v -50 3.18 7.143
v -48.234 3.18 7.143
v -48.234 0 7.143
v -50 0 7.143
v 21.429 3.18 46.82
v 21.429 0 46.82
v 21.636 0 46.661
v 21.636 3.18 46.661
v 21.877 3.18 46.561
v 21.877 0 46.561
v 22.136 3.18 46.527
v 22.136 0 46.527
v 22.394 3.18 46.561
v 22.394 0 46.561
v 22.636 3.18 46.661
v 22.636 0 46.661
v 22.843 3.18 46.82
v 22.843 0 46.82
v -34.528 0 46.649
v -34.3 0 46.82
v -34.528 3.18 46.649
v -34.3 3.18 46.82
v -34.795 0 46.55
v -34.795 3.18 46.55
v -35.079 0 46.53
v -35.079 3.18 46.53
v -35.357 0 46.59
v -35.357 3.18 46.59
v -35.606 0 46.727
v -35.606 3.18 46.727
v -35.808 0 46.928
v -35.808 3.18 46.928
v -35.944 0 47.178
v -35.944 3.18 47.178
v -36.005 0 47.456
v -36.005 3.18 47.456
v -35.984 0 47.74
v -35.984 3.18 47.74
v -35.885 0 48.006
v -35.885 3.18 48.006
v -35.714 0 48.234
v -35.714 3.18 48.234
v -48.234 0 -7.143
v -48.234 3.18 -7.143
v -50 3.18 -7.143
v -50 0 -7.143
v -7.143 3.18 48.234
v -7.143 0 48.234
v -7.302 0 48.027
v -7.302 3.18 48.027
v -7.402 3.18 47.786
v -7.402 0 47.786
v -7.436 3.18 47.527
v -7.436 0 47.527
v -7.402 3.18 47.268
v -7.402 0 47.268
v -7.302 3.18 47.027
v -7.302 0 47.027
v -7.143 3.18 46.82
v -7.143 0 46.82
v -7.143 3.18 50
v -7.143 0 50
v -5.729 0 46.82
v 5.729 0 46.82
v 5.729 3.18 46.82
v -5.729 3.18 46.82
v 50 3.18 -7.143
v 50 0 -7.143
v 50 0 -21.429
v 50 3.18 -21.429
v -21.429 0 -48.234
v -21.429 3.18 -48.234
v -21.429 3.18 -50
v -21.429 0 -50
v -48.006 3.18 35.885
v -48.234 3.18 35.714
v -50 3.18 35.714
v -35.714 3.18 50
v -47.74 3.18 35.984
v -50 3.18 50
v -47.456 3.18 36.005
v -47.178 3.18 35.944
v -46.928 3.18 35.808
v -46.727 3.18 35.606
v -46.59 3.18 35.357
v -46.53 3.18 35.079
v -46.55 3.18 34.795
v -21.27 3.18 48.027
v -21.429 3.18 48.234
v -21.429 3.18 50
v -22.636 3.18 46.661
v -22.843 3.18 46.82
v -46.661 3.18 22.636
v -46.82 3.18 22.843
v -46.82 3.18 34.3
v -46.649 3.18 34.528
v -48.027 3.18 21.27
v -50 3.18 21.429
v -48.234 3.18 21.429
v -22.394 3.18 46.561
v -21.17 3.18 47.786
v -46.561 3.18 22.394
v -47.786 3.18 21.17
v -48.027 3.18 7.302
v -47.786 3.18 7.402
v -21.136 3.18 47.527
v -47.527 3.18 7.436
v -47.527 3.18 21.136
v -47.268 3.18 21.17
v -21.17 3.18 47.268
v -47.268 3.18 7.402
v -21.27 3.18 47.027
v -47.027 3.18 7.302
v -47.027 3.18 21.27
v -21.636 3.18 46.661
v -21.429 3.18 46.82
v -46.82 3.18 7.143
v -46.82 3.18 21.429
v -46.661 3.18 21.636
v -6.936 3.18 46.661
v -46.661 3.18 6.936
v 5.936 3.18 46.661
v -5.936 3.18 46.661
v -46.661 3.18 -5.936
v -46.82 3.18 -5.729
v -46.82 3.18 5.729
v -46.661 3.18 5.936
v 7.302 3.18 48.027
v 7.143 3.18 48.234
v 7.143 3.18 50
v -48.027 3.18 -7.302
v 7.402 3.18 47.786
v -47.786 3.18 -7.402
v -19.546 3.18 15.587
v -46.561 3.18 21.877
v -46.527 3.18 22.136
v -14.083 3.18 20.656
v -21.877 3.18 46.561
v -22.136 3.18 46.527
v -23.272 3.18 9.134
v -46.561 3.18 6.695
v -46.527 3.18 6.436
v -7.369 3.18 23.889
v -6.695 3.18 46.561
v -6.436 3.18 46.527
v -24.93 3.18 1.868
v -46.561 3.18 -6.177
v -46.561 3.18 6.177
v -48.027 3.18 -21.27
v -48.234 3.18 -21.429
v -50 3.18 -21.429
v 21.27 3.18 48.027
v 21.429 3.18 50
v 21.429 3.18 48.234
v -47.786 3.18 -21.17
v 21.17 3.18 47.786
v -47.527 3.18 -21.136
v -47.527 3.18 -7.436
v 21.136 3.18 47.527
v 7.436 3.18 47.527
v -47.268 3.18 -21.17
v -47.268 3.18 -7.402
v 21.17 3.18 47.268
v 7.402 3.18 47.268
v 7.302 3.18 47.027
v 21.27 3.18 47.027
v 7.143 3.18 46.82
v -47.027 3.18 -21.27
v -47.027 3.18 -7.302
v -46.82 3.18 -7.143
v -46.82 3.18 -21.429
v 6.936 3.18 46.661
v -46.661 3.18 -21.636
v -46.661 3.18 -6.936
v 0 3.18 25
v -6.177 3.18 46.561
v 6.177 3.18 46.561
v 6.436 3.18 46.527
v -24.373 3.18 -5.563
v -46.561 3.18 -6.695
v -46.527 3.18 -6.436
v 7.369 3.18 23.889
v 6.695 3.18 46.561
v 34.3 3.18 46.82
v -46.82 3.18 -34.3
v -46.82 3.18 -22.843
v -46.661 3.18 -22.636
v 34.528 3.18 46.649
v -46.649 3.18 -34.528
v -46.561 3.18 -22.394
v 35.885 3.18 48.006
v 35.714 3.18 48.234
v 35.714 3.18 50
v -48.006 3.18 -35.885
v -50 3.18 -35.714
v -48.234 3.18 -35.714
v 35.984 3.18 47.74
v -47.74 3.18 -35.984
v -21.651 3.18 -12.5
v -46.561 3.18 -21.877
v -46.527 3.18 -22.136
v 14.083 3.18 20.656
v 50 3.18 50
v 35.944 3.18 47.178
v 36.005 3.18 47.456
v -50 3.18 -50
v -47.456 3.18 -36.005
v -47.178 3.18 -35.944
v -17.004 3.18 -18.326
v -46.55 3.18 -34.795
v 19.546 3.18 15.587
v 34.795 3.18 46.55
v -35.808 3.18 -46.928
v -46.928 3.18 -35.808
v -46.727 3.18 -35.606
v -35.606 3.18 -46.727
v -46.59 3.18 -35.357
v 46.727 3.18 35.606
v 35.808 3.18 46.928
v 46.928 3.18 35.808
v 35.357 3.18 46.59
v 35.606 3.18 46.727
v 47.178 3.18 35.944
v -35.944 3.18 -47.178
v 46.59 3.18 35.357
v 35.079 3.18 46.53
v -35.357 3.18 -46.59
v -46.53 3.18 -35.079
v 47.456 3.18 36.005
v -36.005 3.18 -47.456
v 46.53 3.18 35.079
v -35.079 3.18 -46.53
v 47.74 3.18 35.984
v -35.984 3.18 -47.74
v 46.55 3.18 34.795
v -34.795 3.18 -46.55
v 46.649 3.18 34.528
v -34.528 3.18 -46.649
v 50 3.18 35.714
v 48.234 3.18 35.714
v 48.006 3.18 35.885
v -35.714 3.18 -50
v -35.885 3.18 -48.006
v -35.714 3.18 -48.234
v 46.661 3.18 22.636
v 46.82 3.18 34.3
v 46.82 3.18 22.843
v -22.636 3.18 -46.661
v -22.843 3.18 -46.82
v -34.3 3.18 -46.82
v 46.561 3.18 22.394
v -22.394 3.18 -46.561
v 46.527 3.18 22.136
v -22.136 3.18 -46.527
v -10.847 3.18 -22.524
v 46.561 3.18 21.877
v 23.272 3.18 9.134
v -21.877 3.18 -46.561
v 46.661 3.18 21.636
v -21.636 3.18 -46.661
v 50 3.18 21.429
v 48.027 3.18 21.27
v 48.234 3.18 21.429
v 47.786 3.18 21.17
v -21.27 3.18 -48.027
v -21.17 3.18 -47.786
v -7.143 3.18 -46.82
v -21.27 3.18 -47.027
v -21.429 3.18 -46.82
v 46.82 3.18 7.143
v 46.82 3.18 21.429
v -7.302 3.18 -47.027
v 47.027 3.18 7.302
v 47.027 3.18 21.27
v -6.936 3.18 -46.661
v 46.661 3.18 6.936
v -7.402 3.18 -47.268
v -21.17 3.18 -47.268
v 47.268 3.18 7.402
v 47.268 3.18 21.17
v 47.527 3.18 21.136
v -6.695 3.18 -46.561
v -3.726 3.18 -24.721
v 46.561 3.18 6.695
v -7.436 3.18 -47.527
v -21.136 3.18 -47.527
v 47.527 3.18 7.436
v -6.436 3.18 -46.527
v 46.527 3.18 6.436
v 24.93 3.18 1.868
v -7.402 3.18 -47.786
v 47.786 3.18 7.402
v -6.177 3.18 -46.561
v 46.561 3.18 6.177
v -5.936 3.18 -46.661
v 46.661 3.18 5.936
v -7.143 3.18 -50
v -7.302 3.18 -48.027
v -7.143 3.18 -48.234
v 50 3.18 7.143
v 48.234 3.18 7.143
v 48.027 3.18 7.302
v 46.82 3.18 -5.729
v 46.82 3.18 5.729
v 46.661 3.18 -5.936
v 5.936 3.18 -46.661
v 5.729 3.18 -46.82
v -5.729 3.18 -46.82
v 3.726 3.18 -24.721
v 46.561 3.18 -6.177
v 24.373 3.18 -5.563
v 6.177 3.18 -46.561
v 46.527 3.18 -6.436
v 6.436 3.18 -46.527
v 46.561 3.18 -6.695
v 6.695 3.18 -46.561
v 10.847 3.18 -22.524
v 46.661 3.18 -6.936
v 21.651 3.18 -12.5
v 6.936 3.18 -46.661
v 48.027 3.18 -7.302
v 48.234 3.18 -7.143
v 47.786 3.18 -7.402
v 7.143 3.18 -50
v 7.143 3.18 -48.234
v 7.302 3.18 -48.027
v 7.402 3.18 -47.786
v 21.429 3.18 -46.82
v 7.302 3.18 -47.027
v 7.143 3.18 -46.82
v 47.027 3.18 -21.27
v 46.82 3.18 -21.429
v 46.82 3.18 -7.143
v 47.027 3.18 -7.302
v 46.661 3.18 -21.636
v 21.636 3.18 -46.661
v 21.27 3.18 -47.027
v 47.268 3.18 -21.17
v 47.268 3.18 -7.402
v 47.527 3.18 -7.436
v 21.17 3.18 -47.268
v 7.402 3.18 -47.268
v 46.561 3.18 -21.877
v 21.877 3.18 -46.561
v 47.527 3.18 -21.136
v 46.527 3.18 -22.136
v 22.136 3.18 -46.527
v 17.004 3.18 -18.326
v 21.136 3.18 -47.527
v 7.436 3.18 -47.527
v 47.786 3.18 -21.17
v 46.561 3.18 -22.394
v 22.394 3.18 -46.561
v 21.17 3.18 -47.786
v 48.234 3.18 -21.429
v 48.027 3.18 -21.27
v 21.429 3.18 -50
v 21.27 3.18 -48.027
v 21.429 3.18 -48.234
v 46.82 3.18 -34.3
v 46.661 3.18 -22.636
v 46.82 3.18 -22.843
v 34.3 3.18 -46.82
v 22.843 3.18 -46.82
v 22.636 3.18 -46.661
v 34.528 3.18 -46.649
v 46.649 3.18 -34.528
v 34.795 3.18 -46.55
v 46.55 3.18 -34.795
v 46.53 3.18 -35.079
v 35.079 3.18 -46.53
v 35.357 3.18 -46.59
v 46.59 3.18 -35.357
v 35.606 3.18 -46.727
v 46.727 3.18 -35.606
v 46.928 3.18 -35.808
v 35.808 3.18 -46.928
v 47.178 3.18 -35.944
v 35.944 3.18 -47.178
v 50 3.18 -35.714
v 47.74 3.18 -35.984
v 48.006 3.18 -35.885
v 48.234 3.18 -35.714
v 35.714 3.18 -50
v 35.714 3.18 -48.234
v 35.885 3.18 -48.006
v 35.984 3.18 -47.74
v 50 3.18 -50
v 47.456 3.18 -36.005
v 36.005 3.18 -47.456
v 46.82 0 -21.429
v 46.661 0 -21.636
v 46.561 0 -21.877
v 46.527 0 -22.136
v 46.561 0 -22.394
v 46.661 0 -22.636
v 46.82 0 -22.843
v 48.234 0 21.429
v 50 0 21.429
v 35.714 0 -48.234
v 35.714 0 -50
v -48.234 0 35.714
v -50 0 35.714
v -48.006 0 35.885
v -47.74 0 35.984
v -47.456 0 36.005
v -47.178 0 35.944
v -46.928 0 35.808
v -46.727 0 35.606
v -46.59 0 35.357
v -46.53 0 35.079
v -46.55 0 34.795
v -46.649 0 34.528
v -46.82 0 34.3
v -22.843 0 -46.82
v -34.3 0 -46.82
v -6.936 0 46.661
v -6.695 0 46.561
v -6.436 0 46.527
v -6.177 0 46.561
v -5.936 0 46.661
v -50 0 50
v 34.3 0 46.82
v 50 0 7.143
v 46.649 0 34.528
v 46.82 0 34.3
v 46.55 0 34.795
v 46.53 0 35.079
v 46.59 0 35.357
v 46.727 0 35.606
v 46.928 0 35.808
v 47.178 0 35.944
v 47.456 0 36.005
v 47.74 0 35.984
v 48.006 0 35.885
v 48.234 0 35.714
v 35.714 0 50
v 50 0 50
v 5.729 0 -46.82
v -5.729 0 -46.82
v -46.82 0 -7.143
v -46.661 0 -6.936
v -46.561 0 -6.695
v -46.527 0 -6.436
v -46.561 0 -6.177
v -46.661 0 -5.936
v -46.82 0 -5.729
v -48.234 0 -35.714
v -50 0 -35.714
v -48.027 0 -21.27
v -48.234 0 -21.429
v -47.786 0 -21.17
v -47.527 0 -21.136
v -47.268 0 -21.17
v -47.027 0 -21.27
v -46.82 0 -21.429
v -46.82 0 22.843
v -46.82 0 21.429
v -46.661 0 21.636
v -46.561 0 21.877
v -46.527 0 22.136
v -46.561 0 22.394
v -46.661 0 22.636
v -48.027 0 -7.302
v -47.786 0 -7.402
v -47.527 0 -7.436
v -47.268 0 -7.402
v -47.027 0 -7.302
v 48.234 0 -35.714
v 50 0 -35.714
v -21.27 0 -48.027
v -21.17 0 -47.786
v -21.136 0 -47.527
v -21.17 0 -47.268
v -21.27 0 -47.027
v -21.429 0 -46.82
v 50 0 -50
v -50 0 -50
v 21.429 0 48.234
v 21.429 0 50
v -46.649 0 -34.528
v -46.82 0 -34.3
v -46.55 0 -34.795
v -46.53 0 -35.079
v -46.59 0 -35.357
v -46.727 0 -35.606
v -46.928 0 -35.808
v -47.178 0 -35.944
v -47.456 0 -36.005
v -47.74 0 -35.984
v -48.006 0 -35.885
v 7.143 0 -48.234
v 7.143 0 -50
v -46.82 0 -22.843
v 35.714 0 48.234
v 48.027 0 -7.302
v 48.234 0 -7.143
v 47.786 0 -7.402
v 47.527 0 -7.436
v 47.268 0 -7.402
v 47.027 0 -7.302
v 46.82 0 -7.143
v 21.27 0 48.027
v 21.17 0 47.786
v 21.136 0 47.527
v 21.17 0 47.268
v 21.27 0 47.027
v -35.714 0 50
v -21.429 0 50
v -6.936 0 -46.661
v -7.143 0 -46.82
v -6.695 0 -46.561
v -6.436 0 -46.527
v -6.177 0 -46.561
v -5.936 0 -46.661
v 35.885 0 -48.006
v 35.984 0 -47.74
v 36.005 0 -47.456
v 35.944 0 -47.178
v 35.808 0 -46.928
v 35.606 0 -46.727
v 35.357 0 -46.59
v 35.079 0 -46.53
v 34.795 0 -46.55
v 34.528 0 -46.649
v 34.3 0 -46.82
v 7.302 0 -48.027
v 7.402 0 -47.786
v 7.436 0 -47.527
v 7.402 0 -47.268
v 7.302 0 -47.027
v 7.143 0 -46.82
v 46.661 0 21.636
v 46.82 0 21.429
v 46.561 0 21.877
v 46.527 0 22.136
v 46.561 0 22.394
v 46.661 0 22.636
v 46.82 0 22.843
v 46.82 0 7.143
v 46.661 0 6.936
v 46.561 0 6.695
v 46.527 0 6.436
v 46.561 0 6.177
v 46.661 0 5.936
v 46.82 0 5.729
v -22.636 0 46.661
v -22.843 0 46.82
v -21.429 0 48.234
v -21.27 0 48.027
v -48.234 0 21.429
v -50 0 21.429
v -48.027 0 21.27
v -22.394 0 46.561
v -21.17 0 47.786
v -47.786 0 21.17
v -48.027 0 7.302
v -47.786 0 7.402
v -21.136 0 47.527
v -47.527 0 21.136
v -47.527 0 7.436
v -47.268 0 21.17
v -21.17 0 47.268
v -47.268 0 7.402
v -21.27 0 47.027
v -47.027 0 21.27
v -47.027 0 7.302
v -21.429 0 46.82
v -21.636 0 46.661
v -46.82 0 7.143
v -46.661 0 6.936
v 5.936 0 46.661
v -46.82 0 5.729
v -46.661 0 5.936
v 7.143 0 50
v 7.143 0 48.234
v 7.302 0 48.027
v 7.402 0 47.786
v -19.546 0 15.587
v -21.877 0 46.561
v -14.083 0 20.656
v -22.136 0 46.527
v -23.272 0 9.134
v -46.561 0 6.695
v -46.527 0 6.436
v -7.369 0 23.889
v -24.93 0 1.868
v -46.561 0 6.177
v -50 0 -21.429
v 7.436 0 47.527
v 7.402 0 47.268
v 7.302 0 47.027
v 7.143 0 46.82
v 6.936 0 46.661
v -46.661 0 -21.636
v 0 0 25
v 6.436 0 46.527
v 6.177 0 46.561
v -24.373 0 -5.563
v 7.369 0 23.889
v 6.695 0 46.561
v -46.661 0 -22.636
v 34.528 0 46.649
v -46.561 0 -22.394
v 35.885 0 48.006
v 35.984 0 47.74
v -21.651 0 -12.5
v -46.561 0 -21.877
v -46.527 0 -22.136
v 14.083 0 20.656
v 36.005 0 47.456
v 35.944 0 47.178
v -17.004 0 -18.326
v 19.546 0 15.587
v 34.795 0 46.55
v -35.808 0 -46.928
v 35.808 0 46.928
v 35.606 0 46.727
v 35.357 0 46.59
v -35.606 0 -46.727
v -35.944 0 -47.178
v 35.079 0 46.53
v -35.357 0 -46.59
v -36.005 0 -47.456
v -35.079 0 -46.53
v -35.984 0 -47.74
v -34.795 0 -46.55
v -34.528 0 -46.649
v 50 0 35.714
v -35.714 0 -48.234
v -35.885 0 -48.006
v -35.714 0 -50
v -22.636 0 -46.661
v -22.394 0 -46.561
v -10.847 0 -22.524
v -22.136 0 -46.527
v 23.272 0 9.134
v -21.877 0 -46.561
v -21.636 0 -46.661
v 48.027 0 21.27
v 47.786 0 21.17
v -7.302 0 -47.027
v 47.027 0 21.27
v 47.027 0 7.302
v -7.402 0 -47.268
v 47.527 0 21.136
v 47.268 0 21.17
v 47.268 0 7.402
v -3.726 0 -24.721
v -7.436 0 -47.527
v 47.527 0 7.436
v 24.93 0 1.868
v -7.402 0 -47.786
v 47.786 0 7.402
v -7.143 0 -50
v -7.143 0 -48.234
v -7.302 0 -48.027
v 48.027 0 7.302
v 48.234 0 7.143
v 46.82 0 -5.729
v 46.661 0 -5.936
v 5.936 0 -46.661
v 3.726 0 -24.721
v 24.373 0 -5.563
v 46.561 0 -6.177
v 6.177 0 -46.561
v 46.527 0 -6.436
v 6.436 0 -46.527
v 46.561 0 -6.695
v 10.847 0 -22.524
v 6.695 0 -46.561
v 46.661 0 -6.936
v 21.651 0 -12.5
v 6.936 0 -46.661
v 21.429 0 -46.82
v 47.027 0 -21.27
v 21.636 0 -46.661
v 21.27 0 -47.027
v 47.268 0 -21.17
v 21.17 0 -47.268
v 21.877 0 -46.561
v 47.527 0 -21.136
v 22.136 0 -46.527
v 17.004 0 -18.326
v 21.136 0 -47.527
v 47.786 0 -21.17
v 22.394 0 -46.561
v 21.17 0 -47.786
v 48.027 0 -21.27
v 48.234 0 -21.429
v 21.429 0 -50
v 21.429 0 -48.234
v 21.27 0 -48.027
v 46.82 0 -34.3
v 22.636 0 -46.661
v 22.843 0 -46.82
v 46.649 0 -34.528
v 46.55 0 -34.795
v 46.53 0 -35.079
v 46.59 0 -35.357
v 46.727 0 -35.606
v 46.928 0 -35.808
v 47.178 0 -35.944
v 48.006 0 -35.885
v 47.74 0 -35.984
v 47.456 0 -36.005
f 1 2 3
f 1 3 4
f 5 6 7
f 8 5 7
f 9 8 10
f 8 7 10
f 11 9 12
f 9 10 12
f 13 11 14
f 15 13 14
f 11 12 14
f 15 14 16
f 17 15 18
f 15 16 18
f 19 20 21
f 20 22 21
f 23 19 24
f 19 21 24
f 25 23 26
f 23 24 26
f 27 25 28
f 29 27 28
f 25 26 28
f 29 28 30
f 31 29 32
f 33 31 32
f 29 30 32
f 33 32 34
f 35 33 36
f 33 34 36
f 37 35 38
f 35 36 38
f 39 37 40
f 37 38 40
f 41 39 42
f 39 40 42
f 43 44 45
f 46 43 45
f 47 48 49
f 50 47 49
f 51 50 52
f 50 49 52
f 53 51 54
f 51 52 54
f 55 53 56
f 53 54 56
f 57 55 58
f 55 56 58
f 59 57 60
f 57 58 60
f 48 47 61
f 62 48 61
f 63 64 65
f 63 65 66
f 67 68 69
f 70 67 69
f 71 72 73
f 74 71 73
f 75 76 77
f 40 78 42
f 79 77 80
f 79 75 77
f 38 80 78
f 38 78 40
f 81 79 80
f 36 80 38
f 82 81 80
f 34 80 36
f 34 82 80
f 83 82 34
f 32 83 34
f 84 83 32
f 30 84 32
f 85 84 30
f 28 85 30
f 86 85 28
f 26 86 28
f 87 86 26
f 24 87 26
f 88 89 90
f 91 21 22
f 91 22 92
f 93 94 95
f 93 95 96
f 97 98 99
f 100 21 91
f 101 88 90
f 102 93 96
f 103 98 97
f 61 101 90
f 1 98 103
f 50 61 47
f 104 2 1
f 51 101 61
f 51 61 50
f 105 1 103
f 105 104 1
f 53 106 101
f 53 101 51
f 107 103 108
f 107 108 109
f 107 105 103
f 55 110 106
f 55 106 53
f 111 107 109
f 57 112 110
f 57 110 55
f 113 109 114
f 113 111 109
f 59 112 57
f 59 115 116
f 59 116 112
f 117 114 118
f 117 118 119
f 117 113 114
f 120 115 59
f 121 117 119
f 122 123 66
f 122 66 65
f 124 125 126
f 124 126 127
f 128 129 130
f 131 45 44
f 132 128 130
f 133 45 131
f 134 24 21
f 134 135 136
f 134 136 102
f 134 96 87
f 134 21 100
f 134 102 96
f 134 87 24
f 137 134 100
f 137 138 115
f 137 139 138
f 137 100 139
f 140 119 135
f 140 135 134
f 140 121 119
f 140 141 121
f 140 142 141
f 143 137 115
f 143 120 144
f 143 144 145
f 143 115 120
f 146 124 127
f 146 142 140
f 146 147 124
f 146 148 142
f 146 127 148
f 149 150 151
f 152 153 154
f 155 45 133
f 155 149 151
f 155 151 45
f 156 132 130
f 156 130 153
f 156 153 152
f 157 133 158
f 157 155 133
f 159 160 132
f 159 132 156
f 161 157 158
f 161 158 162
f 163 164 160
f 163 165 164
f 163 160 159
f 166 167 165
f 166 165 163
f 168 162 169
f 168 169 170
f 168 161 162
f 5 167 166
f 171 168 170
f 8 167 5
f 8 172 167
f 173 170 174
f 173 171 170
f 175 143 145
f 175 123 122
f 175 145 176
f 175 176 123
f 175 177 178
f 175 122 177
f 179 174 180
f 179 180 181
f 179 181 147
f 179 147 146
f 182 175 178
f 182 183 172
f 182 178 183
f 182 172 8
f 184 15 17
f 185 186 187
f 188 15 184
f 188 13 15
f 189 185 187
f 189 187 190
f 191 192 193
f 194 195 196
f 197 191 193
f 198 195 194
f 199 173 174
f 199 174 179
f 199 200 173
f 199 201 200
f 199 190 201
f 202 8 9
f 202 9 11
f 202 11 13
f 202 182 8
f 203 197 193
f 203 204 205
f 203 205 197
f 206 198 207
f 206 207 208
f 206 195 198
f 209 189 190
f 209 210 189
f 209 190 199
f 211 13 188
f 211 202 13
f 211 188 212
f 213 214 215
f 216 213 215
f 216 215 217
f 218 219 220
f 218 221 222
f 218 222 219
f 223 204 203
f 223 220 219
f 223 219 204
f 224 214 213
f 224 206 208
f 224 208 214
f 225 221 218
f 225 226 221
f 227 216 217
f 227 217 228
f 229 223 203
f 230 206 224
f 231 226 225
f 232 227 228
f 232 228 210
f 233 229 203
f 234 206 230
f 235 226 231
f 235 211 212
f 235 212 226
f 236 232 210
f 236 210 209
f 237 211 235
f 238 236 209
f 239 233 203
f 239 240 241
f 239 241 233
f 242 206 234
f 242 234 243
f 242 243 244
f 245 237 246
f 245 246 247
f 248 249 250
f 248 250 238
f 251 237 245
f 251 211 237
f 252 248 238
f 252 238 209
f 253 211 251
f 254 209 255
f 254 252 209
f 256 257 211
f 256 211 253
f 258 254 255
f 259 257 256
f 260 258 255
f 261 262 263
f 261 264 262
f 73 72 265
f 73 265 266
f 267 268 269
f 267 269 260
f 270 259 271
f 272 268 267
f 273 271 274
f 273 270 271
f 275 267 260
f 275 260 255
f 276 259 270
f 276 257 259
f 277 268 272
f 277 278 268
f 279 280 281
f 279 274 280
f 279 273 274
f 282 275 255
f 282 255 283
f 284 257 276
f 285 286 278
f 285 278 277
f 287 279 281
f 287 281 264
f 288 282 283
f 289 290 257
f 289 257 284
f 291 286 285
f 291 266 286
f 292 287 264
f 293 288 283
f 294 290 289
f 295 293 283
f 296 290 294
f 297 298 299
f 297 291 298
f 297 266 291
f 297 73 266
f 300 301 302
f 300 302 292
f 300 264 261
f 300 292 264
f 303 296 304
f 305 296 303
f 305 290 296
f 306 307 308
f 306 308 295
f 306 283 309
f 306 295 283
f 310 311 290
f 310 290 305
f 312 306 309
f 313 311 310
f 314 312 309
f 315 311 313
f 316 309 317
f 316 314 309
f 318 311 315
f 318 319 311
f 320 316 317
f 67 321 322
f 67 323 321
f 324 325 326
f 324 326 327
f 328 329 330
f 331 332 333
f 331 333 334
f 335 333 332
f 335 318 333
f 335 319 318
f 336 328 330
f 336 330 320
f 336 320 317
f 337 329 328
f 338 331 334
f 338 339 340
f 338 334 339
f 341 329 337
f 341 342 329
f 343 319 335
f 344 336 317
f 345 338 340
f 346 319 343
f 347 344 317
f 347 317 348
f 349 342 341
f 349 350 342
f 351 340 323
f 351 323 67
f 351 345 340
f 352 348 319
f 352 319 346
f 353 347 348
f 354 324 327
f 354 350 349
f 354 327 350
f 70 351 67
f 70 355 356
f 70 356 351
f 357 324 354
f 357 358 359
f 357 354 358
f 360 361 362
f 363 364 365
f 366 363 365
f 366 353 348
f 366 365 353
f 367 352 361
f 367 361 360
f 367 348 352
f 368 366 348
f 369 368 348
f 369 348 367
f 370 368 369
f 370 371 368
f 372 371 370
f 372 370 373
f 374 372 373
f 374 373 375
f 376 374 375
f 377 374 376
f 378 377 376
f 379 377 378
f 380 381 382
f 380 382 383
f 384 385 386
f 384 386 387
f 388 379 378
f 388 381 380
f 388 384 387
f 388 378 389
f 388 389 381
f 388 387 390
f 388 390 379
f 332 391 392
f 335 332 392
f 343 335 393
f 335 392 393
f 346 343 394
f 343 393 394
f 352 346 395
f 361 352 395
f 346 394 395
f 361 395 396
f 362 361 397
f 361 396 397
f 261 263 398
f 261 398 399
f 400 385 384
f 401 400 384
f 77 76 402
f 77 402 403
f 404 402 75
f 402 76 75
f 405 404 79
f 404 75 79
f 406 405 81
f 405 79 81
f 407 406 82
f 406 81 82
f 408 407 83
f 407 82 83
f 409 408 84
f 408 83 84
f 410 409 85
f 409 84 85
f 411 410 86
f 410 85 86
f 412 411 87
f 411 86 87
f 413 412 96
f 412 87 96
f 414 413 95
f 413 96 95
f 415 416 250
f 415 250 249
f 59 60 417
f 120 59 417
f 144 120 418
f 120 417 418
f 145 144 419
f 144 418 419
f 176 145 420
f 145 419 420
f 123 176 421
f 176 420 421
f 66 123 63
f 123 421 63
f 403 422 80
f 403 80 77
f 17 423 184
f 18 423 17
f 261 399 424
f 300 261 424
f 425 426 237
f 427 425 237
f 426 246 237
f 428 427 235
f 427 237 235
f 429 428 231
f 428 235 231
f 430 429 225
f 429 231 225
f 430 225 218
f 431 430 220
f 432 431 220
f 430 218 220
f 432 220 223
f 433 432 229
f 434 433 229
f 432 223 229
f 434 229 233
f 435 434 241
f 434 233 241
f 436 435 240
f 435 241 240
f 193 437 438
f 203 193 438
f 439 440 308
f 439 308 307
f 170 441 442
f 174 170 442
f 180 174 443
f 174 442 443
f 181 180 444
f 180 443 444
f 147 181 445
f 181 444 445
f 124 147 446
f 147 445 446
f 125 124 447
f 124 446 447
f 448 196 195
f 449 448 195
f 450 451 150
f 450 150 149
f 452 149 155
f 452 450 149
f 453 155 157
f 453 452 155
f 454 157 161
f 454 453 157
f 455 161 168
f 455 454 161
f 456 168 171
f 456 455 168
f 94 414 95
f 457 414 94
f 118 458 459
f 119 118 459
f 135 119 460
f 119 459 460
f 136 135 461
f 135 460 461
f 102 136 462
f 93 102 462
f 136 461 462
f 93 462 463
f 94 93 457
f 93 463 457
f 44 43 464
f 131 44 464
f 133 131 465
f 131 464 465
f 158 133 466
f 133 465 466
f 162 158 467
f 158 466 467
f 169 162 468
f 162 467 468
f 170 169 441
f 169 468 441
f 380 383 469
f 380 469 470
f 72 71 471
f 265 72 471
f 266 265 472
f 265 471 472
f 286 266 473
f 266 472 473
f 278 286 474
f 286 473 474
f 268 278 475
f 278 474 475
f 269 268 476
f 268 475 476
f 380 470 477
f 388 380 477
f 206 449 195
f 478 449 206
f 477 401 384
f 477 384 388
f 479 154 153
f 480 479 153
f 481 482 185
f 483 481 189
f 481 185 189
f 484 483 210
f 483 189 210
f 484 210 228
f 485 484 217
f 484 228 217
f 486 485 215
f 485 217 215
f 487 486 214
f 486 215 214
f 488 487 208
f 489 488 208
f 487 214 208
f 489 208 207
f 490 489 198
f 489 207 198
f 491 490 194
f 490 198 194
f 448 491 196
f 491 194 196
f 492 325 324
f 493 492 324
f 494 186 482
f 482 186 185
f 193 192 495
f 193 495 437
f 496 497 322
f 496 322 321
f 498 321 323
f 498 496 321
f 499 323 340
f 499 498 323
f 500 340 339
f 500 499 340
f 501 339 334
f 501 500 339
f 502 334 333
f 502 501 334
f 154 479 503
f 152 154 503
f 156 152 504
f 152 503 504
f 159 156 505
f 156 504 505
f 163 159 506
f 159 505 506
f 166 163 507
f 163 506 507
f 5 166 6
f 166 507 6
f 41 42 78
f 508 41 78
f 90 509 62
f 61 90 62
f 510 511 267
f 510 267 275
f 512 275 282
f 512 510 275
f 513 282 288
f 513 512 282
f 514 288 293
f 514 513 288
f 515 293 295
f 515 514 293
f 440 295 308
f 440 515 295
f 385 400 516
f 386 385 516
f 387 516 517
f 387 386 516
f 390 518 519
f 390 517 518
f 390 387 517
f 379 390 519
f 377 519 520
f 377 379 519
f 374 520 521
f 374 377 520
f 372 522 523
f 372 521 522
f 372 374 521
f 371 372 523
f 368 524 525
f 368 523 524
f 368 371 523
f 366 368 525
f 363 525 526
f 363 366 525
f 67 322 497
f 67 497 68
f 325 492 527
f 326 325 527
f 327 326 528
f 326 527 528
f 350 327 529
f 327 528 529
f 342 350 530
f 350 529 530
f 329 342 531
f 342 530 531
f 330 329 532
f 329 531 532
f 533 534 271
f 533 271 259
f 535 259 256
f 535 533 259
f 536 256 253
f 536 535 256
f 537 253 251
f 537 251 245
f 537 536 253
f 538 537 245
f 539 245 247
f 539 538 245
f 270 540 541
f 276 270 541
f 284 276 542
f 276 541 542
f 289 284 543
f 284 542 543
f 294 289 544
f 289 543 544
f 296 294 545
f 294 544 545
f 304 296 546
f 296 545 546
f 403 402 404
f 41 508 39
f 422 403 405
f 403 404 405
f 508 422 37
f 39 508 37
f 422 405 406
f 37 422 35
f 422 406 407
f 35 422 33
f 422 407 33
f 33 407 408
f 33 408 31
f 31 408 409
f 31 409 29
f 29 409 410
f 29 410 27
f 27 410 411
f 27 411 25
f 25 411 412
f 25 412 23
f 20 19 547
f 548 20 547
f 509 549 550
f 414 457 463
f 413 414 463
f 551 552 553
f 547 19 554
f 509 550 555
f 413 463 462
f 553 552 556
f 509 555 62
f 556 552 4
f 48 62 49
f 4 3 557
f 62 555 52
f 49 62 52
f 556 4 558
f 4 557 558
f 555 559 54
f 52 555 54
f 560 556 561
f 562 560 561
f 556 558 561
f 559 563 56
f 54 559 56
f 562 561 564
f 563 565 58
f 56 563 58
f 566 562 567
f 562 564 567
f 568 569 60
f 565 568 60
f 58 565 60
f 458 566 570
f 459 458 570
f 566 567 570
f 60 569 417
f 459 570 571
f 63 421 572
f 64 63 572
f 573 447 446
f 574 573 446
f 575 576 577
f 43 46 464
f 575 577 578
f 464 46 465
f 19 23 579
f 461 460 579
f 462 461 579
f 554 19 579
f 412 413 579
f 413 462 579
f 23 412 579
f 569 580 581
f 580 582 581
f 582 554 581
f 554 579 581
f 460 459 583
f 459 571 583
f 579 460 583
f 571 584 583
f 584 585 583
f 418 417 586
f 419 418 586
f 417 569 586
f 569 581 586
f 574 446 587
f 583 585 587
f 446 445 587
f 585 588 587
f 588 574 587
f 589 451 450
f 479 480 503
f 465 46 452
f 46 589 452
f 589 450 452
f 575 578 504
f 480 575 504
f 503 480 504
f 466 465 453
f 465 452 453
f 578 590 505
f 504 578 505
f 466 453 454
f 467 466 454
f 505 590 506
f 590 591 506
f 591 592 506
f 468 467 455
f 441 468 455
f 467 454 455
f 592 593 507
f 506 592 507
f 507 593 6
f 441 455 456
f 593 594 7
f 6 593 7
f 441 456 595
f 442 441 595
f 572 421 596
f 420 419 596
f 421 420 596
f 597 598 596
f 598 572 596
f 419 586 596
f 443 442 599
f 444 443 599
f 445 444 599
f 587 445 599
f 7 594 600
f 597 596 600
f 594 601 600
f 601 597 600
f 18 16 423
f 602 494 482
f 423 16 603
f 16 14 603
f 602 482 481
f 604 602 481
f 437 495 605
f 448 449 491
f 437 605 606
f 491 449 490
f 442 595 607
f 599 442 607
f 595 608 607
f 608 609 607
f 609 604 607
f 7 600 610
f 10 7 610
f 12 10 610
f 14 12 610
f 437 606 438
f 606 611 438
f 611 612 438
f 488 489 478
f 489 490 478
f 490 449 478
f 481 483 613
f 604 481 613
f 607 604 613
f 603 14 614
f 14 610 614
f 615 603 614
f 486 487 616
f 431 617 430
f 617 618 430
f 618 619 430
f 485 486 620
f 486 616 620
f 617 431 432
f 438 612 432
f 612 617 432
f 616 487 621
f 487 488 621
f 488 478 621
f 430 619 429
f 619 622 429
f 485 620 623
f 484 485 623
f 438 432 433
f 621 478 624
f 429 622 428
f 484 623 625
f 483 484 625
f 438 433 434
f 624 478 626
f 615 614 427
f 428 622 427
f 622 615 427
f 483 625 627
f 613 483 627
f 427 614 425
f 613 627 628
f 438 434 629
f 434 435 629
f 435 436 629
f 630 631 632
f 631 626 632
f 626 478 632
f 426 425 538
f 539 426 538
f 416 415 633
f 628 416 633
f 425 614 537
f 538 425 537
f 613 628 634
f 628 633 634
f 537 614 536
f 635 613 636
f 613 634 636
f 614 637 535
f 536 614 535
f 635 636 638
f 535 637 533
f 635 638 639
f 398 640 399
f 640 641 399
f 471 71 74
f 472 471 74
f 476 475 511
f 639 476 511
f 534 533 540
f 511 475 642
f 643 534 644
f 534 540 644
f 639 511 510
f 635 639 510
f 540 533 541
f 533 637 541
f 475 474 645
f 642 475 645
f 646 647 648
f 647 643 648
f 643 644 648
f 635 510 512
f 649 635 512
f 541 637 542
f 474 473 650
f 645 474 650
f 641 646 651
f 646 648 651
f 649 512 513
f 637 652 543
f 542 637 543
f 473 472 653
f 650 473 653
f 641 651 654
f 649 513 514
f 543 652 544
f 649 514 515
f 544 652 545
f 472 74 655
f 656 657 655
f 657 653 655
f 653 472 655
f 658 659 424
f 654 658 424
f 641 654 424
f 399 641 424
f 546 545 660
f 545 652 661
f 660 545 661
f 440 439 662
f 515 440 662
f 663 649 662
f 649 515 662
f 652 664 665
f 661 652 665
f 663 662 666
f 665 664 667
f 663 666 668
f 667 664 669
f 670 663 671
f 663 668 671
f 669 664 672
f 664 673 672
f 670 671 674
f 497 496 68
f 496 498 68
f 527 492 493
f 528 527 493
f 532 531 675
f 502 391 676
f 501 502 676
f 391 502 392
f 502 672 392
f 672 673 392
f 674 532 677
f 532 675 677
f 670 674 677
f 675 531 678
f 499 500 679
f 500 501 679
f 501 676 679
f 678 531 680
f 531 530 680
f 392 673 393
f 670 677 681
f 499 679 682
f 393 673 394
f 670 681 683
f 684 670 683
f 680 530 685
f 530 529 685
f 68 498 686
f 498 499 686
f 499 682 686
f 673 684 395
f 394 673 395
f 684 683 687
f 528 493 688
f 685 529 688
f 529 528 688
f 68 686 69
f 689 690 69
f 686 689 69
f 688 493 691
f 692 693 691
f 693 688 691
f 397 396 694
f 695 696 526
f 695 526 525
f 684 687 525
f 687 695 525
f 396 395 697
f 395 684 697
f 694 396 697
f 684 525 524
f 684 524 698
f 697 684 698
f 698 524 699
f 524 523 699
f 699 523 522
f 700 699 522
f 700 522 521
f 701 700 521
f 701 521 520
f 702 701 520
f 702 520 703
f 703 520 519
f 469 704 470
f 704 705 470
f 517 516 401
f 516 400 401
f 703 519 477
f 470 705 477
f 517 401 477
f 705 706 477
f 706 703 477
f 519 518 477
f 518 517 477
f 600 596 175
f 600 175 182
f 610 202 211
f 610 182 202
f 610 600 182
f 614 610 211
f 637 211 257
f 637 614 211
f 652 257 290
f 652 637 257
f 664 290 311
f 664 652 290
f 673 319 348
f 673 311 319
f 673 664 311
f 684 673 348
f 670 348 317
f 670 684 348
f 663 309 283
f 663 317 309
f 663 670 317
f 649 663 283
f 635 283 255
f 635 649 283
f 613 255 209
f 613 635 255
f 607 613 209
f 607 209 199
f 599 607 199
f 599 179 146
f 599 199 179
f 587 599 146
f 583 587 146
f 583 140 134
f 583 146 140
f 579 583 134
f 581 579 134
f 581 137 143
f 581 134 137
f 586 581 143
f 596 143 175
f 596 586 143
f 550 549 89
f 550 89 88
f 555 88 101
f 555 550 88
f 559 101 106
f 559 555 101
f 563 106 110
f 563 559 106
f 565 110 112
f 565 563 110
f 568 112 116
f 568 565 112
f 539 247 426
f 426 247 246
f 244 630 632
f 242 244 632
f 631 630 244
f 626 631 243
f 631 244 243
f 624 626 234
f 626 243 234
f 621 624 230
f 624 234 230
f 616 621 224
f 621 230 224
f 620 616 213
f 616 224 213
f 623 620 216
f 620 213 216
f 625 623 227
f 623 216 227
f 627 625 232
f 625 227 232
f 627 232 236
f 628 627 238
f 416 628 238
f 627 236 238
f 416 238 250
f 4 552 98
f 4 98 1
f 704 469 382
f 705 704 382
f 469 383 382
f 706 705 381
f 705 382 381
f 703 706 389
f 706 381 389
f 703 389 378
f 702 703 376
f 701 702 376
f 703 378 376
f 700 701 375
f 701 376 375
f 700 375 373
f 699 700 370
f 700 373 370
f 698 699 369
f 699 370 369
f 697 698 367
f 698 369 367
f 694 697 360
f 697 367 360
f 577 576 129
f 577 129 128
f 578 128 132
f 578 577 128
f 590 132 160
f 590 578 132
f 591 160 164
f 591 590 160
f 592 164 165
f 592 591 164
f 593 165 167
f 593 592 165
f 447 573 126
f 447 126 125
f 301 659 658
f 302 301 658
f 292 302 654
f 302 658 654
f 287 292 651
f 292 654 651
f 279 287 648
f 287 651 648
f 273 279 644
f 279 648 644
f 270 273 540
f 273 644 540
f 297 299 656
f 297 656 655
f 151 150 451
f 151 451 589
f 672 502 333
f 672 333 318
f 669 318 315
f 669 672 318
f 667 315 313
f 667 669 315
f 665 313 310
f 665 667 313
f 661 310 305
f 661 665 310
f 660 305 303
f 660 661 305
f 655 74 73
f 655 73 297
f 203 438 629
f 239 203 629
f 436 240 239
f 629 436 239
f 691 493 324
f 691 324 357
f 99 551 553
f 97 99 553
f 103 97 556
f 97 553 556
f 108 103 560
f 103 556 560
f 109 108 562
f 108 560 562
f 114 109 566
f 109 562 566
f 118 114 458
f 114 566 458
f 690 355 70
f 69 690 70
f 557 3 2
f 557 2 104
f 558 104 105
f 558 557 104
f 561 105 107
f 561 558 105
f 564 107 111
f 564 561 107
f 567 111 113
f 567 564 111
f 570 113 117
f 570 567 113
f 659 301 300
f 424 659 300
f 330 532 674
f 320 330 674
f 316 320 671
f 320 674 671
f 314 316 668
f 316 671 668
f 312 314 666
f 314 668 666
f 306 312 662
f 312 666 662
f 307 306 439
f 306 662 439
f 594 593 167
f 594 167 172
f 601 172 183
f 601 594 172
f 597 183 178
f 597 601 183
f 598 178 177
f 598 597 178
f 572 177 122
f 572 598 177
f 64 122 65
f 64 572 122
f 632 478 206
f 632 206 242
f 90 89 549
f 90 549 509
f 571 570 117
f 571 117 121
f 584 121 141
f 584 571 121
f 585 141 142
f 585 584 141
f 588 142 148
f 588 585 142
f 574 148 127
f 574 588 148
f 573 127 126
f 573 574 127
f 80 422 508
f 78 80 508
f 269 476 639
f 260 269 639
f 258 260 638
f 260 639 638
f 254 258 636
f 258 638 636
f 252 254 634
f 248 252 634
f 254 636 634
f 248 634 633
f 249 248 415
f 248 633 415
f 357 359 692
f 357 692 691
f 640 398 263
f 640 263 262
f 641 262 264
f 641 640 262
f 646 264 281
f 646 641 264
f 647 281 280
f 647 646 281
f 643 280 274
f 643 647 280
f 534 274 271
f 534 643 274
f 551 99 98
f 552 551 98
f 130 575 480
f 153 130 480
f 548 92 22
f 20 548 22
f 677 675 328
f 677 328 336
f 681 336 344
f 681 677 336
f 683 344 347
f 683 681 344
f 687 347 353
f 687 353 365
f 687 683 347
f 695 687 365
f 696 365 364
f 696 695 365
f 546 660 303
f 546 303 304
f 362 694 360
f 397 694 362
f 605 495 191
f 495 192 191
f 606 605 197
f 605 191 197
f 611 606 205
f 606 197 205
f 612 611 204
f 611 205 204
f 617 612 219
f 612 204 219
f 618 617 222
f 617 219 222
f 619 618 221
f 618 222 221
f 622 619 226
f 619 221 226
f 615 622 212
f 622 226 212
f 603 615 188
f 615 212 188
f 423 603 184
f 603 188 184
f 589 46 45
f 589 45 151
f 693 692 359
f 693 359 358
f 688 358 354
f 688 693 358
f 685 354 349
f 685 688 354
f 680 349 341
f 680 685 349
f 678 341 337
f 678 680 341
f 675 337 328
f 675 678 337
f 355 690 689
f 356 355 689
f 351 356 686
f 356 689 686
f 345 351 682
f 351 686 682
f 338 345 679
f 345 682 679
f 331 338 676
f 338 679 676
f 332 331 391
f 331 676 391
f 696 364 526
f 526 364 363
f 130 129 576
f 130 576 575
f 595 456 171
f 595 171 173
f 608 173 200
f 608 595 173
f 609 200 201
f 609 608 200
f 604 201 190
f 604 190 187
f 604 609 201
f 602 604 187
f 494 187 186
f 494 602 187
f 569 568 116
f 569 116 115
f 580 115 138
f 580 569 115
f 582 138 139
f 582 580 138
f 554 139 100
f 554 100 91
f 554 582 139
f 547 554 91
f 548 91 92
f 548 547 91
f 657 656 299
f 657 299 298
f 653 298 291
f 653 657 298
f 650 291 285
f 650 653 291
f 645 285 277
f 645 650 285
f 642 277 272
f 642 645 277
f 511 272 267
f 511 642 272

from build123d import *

# Parameters (mm, degrees)
SKETCH1_W                   = 100
SKETCH1_H                   = 100
BOSS_EXTRUDE1_DEPTH         = 3.18
SKETCH2_W                   = 14.285714285
SKETCH2_H                   = 3.18
SKETCH2_W_2                 = 14.285714286
CUT_EXTRUDE1_DEPTH          = 71.782147467
SKETCH3_R                   = 1
CUT_EXTRUDE2_DEPTH          = 71.782147467
SKETCH_PATTERN1_DEPTH       = 3.18
CIRPATTERN1_COUNT           = 4
CIRPATTERN1_COPY_1_SKETCH_R = 1
CIRPATTERN1_COPY_1_DEPTH    = 71.782147467
CIRPATTERN1_COPY_2_SKETCH_R = 1
CIRPATTERN1_COPY_2_DEPTH    = 71.782147467
CIRPATTERN1_COPY_3_SKETCH_R = 1
CIRPATTERN1_COPY_3_DEPTH    = 71.782147467
CIRPATTERN1_COPY_4_DEPTH    = 3.18
CIRPATTERN1_COPY_5_DEPTH    = 3.18
CIRPATTERN1_COPY_6_DEPTH    = 3.18
CUT_EXTRUDE3_DEPTH          = 71.782147467
CUT_EXTRUDE3_DEPTH_BACK     = 71.782147467
SKETCH5_R                   = 25


# Read off the part's stored shape, not the designer's step: Sketch-Pattern1
with BuildPart() as part:
    # Sketch1 → Boss-Extrude1 (new body)
    with BuildSketch(Plane(origin=(0, 0, 0), x_dir=(1, 0, 0), z_dir=(0, 1, 0))):
        Rectangle(SKETCH1_W, SKETCH1_H)
    extrude(amount=BOSS_EXTRUDE1_DEPTH)

    # Sketch2 → Cut-Extrude1 (cut, symmetric)
    with BuildSketch(Plane(origin=(0, 3.18, 0), x_dir=(1, 0, 0), z_dir=(0, 1, 0))):
        with Locations((-28.571428572, 48.41)):
            Rectangle(SKETCH2_W, SKETCH2_H)
        with Locations((0, 48.41)):
            Rectangle(SKETCH2_W_2, SKETCH2_H)
        with Locations((28.571428572, 48.41)):
            Rectangle(SKETCH2_W, SKETCH2_H)
    cut_extrude1 = extrude(amount=CUT_EXTRUDE1_DEPTH, both=True, mode=Mode.SUBTRACT)

    # Sketch3 → Cut-Extrude2 (cut, symmetric)
    with BuildSketch(Plane(origin=(0, 3.18, 0), x_dir=(1, 0, 0), z_dir=(0, 1, 0))):
        with Locations((-35.007178933, 47.527106781)):
            Circle(SKETCH3_R)
    cut_extrude2 = extrude(amount=CUT_EXTRUDE2_DEPTH, both=True, mode=Mode.SUBTRACT)

    # Sketch-Pattern1 outline → Sketch-Pattern1 (cut)
    with BuildSketch(Plane(origin=(0, 0, 0), x_dir=(1, 0, 0), z_dir=(0, 1, 0))):
        with BuildLine():
            Line((-7.142857143, 46.82), (-7.142857143, 48.234213562))
            ThreePointArc((-7.142857143, 48.234213562), (-7.435750362, 47.527106781), (-7.142857143, 46.82))
        make_face()
        with BuildLine():
            Line((-5.72864358, 46.82), (-7.142857143, 46.82))
            ThreePointArc((-7.142857143, 46.82), (-6.435750362, 46.527106781), (-5.72864358, 46.82))
        make_face()
        with BuildLine():
            Line((21.428571429, 46.82), (21.428571429, 48.234213562))
            ThreePointArc((21.428571429, 48.234213562), (21.13567821, 47.527106781), (21.428571429, 46.82))
        make_face()
        with BuildLine():
            Line((22.842784991, 46.82), (21.428571429, 46.82))
            ThreePointArc((21.428571429, 46.82), (22.13567821, 46.527106781), (22.842784991, 46.82))
        make_face()
    sketch_pattern1 = extrude(amount=SKETCH_PATTERN1_DEPTH, mode=Mode.SUBTRACT)

    # Mirror1: Cut-Extrude2, Sketch-Pattern1 across plane
    add(cut_extrude2.mirror(Plane(origin=(0, 0, 0), x_dir=(0, 0, 1), z_dir=(1, 0, 0))), mode=Mode.SUBTRACT)
    add(sketch_pattern1.mirror(Plane(origin=(0, 0, 0), x_dir=(0, 0, 1), z_dir=(1, 0, 0))), mode=Mode.SUBTRACT)

    # CirPattern1: Cut-Extrude1, Cut-Extrude2, Sketch-Pattern1 ×4 about axis
    cirpattern1_axis = Axis((0, 0, 0), (0, 1, 0))
    add([cut_extrude1.rotate(cirpattern1_axis, i * 360 / CIRPATTERN1_COUNT) for i in range(1, CIRPATTERN1_COUNT)], mode=Mode.SUBTRACT)
    add([cut_extrude2.rotate(cirpattern1_axis, i * 360 / CIRPATTERN1_COUNT) for i in range(1, CIRPATTERN1_COUNT)], mode=Mode.SUBTRACT)
    add([sketch_pattern1.rotate(cirpattern1_axis, i * 360 / CIRPATTERN1_COUNT) for i in range(1, CIRPATTERN1_COUNT)], mode=Mode.SUBTRACT)

    # CirPattern1 copy 1 sketch → CirPattern1 copy 1 (cut, symmetric)
    with BuildSketch(Plane.ZX.offset(3.18)):
        with Locations((-35.007178933, -47.527106781)):
            Circle(CIRPATTERN1_COPY_1_SKETCH_R)
    extrude(amount=CIRPATTERN1_COPY_1_DEPTH, both=True, mode=Mode.SUBTRACT)

    # CirPattern1 copy 2 sketch → CirPattern1 copy 2 (cut, symmetric)
    with BuildSketch(Plane(origin=(0, 3.18, 0), x_dir=(1, 0, 0), z_dir=(0, 1, 0))):
        with Locations((-35.007178933, -47.527106781)):
            Circle(CIRPATTERN1_COPY_2_SKETCH_R)
    extrude(amount=CIRPATTERN1_COPY_2_DEPTH, both=True, mode=Mode.SUBTRACT)

    # CirPattern1 copy 3 sketch → CirPattern1 copy 3 (cut, symmetric)
    with BuildSketch(Plane(origin=(0, 3.18, 0), x_dir=(0, 0, -1), z_dir=(0, 1, 0))):
        with Locations((-35.007178933, -47.527106781)):
            Circle(CIRPATTERN1_COPY_3_SKETCH_R)
    extrude(amount=CIRPATTERN1_COPY_3_DEPTH, both=True, mode=Mode.SUBTRACT)

    # CirPattern1 copy 4 sketch → CirPattern1 copy 4 (cut)
    with BuildSketch(Plane.ZX):
        with BuildLine():
            Line((-7.142857143, -46.82), (-7.142857143, -48.234213562))
            ThreePointArc((-7.142857143, -48.234213562), (-7.435750362, -47.527106781), (-7.142857143, -46.82))
        make_face()
        with BuildLine():
            Line((-5.72864358, -46.82), (-7.142857143, -46.82))
            ThreePointArc((-7.142857143, -46.82), (-6.435750362, -46.527106781), (-5.72864358, -46.82))
        make_face()
        with BuildLine():
            Line((21.428571429, -46.82), (21.428571429, -48.234213562))
            ThreePointArc((21.428571429, -48.234213562), (21.13567821, -47.527106781), (21.428571429, -46.82))
        make_face()
        with BuildLine():
            Line((22.842784991, -46.82), (21.428571429, -46.82))
            ThreePointArc((21.428571429, -46.82), (22.13567821, -46.527106781), (22.842784991, -46.82))
        make_face()
    extrude(amount=CIRPATTERN1_COPY_4_DEPTH, mode=Mode.SUBTRACT)

    # CirPattern1 copy 5 sketch → CirPattern1 copy 5 (cut)
    with BuildSketch(Plane(origin=(0, 0, 0), x_dir=(1, 0, 0), z_dir=(0, 1, 0))):
        with BuildLine():
            Line((-7.142857143, -46.82), (-7.142857143, -48.234213562))
            ThreePointArc((-7.142857143, -48.234213562), (-7.435750362, -47.527106781), (-7.142857143, -46.82))
        make_face()
        with BuildLine():
            Line((-5.72864358, -46.82), (-7.142857143, -46.82))
            ThreePointArc((-7.142857143, -46.82), (-6.435750362, -46.527106781), (-5.72864358, -46.82))
        make_face()
        with BuildLine():
            Line((21.428571429, -46.82), (21.428571429, -48.234213562))
            ThreePointArc((21.428571429, -48.234213562), (21.13567821, -47.527106781), (21.428571429, -46.82))
        make_face()
        with BuildLine():
            Line((22.842784991, -46.82), (21.428571429, -46.82))
            ThreePointArc((21.428571429, -46.82), (22.13567821, -46.527106781), (22.842784991, -46.82))
        make_face()
    extrude(amount=CIRPATTERN1_COPY_5_DEPTH, mode=Mode.SUBTRACT)

    # CirPattern1 copy 6 sketch → CirPattern1 copy 6 (cut)
    with BuildSketch(Plane(origin=(0, 0, 0), x_dir=(0, 0, -1), z_dir=(0, 1, 0))):
        with BuildLine():
            Line((-7.142857143, -46.82), (-7.142857143, -48.234213562))
            ThreePointArc((-7.142857143, -48.234213562), (-7.435750362, -47.527106781), (-7.142857143, -46.82))
        make_face()
        with BuildLine():
            Line((-5.72864358, -46.82), (-7.142857143, -46.82))
            ThreePointArc((-7.142857143, -46.82), (-6.435750362, -46.527106781), (-5.72864358, -46.82))
        make_face()
        with BuildLine():
            Line((21.428571429, -46.82), (21.428571429, -48.234213562))
            ThreePointArc((21.428571429, -48.234213562), (21.13567821, -47.527106781), (21.428571429, -46.82))
        make_face()
        with BuildLine():
            Line((22.842784991, -46.82), (21.428571429, -46.82))
            ThreePointArc((21.428571429, -46.82), (22.13567821, -46.527106781), (22.842784991, -46.82))
        make_face()
    extrude(amount=CIRPATTERN1_COPY_6_DEPTH, mode=Mode.SUBTRACT)

    # Sketch5 → Cut-Extrude3 (cut, two sides: drawn at the far end of the back side and taken through both)
    with BuildSketch(Plane(origin=(0, 3.18, 0), x_dir=(1, 0, 0), z_dir=(0, 1, 0)).offset(-CUT_EXTRUDE3_DEPTH_BACK)):
        with Locations(Location((0, 0, 0), (0, 0, 270))):
            Circle(SKETCH5_R)
    extrude(amount=CUT_EXTRUDE3_DEPTH + CUT_EXTRUDE3_DEPTH_BACK, mode=Mode.SUBTRACT)


solid = part.part
